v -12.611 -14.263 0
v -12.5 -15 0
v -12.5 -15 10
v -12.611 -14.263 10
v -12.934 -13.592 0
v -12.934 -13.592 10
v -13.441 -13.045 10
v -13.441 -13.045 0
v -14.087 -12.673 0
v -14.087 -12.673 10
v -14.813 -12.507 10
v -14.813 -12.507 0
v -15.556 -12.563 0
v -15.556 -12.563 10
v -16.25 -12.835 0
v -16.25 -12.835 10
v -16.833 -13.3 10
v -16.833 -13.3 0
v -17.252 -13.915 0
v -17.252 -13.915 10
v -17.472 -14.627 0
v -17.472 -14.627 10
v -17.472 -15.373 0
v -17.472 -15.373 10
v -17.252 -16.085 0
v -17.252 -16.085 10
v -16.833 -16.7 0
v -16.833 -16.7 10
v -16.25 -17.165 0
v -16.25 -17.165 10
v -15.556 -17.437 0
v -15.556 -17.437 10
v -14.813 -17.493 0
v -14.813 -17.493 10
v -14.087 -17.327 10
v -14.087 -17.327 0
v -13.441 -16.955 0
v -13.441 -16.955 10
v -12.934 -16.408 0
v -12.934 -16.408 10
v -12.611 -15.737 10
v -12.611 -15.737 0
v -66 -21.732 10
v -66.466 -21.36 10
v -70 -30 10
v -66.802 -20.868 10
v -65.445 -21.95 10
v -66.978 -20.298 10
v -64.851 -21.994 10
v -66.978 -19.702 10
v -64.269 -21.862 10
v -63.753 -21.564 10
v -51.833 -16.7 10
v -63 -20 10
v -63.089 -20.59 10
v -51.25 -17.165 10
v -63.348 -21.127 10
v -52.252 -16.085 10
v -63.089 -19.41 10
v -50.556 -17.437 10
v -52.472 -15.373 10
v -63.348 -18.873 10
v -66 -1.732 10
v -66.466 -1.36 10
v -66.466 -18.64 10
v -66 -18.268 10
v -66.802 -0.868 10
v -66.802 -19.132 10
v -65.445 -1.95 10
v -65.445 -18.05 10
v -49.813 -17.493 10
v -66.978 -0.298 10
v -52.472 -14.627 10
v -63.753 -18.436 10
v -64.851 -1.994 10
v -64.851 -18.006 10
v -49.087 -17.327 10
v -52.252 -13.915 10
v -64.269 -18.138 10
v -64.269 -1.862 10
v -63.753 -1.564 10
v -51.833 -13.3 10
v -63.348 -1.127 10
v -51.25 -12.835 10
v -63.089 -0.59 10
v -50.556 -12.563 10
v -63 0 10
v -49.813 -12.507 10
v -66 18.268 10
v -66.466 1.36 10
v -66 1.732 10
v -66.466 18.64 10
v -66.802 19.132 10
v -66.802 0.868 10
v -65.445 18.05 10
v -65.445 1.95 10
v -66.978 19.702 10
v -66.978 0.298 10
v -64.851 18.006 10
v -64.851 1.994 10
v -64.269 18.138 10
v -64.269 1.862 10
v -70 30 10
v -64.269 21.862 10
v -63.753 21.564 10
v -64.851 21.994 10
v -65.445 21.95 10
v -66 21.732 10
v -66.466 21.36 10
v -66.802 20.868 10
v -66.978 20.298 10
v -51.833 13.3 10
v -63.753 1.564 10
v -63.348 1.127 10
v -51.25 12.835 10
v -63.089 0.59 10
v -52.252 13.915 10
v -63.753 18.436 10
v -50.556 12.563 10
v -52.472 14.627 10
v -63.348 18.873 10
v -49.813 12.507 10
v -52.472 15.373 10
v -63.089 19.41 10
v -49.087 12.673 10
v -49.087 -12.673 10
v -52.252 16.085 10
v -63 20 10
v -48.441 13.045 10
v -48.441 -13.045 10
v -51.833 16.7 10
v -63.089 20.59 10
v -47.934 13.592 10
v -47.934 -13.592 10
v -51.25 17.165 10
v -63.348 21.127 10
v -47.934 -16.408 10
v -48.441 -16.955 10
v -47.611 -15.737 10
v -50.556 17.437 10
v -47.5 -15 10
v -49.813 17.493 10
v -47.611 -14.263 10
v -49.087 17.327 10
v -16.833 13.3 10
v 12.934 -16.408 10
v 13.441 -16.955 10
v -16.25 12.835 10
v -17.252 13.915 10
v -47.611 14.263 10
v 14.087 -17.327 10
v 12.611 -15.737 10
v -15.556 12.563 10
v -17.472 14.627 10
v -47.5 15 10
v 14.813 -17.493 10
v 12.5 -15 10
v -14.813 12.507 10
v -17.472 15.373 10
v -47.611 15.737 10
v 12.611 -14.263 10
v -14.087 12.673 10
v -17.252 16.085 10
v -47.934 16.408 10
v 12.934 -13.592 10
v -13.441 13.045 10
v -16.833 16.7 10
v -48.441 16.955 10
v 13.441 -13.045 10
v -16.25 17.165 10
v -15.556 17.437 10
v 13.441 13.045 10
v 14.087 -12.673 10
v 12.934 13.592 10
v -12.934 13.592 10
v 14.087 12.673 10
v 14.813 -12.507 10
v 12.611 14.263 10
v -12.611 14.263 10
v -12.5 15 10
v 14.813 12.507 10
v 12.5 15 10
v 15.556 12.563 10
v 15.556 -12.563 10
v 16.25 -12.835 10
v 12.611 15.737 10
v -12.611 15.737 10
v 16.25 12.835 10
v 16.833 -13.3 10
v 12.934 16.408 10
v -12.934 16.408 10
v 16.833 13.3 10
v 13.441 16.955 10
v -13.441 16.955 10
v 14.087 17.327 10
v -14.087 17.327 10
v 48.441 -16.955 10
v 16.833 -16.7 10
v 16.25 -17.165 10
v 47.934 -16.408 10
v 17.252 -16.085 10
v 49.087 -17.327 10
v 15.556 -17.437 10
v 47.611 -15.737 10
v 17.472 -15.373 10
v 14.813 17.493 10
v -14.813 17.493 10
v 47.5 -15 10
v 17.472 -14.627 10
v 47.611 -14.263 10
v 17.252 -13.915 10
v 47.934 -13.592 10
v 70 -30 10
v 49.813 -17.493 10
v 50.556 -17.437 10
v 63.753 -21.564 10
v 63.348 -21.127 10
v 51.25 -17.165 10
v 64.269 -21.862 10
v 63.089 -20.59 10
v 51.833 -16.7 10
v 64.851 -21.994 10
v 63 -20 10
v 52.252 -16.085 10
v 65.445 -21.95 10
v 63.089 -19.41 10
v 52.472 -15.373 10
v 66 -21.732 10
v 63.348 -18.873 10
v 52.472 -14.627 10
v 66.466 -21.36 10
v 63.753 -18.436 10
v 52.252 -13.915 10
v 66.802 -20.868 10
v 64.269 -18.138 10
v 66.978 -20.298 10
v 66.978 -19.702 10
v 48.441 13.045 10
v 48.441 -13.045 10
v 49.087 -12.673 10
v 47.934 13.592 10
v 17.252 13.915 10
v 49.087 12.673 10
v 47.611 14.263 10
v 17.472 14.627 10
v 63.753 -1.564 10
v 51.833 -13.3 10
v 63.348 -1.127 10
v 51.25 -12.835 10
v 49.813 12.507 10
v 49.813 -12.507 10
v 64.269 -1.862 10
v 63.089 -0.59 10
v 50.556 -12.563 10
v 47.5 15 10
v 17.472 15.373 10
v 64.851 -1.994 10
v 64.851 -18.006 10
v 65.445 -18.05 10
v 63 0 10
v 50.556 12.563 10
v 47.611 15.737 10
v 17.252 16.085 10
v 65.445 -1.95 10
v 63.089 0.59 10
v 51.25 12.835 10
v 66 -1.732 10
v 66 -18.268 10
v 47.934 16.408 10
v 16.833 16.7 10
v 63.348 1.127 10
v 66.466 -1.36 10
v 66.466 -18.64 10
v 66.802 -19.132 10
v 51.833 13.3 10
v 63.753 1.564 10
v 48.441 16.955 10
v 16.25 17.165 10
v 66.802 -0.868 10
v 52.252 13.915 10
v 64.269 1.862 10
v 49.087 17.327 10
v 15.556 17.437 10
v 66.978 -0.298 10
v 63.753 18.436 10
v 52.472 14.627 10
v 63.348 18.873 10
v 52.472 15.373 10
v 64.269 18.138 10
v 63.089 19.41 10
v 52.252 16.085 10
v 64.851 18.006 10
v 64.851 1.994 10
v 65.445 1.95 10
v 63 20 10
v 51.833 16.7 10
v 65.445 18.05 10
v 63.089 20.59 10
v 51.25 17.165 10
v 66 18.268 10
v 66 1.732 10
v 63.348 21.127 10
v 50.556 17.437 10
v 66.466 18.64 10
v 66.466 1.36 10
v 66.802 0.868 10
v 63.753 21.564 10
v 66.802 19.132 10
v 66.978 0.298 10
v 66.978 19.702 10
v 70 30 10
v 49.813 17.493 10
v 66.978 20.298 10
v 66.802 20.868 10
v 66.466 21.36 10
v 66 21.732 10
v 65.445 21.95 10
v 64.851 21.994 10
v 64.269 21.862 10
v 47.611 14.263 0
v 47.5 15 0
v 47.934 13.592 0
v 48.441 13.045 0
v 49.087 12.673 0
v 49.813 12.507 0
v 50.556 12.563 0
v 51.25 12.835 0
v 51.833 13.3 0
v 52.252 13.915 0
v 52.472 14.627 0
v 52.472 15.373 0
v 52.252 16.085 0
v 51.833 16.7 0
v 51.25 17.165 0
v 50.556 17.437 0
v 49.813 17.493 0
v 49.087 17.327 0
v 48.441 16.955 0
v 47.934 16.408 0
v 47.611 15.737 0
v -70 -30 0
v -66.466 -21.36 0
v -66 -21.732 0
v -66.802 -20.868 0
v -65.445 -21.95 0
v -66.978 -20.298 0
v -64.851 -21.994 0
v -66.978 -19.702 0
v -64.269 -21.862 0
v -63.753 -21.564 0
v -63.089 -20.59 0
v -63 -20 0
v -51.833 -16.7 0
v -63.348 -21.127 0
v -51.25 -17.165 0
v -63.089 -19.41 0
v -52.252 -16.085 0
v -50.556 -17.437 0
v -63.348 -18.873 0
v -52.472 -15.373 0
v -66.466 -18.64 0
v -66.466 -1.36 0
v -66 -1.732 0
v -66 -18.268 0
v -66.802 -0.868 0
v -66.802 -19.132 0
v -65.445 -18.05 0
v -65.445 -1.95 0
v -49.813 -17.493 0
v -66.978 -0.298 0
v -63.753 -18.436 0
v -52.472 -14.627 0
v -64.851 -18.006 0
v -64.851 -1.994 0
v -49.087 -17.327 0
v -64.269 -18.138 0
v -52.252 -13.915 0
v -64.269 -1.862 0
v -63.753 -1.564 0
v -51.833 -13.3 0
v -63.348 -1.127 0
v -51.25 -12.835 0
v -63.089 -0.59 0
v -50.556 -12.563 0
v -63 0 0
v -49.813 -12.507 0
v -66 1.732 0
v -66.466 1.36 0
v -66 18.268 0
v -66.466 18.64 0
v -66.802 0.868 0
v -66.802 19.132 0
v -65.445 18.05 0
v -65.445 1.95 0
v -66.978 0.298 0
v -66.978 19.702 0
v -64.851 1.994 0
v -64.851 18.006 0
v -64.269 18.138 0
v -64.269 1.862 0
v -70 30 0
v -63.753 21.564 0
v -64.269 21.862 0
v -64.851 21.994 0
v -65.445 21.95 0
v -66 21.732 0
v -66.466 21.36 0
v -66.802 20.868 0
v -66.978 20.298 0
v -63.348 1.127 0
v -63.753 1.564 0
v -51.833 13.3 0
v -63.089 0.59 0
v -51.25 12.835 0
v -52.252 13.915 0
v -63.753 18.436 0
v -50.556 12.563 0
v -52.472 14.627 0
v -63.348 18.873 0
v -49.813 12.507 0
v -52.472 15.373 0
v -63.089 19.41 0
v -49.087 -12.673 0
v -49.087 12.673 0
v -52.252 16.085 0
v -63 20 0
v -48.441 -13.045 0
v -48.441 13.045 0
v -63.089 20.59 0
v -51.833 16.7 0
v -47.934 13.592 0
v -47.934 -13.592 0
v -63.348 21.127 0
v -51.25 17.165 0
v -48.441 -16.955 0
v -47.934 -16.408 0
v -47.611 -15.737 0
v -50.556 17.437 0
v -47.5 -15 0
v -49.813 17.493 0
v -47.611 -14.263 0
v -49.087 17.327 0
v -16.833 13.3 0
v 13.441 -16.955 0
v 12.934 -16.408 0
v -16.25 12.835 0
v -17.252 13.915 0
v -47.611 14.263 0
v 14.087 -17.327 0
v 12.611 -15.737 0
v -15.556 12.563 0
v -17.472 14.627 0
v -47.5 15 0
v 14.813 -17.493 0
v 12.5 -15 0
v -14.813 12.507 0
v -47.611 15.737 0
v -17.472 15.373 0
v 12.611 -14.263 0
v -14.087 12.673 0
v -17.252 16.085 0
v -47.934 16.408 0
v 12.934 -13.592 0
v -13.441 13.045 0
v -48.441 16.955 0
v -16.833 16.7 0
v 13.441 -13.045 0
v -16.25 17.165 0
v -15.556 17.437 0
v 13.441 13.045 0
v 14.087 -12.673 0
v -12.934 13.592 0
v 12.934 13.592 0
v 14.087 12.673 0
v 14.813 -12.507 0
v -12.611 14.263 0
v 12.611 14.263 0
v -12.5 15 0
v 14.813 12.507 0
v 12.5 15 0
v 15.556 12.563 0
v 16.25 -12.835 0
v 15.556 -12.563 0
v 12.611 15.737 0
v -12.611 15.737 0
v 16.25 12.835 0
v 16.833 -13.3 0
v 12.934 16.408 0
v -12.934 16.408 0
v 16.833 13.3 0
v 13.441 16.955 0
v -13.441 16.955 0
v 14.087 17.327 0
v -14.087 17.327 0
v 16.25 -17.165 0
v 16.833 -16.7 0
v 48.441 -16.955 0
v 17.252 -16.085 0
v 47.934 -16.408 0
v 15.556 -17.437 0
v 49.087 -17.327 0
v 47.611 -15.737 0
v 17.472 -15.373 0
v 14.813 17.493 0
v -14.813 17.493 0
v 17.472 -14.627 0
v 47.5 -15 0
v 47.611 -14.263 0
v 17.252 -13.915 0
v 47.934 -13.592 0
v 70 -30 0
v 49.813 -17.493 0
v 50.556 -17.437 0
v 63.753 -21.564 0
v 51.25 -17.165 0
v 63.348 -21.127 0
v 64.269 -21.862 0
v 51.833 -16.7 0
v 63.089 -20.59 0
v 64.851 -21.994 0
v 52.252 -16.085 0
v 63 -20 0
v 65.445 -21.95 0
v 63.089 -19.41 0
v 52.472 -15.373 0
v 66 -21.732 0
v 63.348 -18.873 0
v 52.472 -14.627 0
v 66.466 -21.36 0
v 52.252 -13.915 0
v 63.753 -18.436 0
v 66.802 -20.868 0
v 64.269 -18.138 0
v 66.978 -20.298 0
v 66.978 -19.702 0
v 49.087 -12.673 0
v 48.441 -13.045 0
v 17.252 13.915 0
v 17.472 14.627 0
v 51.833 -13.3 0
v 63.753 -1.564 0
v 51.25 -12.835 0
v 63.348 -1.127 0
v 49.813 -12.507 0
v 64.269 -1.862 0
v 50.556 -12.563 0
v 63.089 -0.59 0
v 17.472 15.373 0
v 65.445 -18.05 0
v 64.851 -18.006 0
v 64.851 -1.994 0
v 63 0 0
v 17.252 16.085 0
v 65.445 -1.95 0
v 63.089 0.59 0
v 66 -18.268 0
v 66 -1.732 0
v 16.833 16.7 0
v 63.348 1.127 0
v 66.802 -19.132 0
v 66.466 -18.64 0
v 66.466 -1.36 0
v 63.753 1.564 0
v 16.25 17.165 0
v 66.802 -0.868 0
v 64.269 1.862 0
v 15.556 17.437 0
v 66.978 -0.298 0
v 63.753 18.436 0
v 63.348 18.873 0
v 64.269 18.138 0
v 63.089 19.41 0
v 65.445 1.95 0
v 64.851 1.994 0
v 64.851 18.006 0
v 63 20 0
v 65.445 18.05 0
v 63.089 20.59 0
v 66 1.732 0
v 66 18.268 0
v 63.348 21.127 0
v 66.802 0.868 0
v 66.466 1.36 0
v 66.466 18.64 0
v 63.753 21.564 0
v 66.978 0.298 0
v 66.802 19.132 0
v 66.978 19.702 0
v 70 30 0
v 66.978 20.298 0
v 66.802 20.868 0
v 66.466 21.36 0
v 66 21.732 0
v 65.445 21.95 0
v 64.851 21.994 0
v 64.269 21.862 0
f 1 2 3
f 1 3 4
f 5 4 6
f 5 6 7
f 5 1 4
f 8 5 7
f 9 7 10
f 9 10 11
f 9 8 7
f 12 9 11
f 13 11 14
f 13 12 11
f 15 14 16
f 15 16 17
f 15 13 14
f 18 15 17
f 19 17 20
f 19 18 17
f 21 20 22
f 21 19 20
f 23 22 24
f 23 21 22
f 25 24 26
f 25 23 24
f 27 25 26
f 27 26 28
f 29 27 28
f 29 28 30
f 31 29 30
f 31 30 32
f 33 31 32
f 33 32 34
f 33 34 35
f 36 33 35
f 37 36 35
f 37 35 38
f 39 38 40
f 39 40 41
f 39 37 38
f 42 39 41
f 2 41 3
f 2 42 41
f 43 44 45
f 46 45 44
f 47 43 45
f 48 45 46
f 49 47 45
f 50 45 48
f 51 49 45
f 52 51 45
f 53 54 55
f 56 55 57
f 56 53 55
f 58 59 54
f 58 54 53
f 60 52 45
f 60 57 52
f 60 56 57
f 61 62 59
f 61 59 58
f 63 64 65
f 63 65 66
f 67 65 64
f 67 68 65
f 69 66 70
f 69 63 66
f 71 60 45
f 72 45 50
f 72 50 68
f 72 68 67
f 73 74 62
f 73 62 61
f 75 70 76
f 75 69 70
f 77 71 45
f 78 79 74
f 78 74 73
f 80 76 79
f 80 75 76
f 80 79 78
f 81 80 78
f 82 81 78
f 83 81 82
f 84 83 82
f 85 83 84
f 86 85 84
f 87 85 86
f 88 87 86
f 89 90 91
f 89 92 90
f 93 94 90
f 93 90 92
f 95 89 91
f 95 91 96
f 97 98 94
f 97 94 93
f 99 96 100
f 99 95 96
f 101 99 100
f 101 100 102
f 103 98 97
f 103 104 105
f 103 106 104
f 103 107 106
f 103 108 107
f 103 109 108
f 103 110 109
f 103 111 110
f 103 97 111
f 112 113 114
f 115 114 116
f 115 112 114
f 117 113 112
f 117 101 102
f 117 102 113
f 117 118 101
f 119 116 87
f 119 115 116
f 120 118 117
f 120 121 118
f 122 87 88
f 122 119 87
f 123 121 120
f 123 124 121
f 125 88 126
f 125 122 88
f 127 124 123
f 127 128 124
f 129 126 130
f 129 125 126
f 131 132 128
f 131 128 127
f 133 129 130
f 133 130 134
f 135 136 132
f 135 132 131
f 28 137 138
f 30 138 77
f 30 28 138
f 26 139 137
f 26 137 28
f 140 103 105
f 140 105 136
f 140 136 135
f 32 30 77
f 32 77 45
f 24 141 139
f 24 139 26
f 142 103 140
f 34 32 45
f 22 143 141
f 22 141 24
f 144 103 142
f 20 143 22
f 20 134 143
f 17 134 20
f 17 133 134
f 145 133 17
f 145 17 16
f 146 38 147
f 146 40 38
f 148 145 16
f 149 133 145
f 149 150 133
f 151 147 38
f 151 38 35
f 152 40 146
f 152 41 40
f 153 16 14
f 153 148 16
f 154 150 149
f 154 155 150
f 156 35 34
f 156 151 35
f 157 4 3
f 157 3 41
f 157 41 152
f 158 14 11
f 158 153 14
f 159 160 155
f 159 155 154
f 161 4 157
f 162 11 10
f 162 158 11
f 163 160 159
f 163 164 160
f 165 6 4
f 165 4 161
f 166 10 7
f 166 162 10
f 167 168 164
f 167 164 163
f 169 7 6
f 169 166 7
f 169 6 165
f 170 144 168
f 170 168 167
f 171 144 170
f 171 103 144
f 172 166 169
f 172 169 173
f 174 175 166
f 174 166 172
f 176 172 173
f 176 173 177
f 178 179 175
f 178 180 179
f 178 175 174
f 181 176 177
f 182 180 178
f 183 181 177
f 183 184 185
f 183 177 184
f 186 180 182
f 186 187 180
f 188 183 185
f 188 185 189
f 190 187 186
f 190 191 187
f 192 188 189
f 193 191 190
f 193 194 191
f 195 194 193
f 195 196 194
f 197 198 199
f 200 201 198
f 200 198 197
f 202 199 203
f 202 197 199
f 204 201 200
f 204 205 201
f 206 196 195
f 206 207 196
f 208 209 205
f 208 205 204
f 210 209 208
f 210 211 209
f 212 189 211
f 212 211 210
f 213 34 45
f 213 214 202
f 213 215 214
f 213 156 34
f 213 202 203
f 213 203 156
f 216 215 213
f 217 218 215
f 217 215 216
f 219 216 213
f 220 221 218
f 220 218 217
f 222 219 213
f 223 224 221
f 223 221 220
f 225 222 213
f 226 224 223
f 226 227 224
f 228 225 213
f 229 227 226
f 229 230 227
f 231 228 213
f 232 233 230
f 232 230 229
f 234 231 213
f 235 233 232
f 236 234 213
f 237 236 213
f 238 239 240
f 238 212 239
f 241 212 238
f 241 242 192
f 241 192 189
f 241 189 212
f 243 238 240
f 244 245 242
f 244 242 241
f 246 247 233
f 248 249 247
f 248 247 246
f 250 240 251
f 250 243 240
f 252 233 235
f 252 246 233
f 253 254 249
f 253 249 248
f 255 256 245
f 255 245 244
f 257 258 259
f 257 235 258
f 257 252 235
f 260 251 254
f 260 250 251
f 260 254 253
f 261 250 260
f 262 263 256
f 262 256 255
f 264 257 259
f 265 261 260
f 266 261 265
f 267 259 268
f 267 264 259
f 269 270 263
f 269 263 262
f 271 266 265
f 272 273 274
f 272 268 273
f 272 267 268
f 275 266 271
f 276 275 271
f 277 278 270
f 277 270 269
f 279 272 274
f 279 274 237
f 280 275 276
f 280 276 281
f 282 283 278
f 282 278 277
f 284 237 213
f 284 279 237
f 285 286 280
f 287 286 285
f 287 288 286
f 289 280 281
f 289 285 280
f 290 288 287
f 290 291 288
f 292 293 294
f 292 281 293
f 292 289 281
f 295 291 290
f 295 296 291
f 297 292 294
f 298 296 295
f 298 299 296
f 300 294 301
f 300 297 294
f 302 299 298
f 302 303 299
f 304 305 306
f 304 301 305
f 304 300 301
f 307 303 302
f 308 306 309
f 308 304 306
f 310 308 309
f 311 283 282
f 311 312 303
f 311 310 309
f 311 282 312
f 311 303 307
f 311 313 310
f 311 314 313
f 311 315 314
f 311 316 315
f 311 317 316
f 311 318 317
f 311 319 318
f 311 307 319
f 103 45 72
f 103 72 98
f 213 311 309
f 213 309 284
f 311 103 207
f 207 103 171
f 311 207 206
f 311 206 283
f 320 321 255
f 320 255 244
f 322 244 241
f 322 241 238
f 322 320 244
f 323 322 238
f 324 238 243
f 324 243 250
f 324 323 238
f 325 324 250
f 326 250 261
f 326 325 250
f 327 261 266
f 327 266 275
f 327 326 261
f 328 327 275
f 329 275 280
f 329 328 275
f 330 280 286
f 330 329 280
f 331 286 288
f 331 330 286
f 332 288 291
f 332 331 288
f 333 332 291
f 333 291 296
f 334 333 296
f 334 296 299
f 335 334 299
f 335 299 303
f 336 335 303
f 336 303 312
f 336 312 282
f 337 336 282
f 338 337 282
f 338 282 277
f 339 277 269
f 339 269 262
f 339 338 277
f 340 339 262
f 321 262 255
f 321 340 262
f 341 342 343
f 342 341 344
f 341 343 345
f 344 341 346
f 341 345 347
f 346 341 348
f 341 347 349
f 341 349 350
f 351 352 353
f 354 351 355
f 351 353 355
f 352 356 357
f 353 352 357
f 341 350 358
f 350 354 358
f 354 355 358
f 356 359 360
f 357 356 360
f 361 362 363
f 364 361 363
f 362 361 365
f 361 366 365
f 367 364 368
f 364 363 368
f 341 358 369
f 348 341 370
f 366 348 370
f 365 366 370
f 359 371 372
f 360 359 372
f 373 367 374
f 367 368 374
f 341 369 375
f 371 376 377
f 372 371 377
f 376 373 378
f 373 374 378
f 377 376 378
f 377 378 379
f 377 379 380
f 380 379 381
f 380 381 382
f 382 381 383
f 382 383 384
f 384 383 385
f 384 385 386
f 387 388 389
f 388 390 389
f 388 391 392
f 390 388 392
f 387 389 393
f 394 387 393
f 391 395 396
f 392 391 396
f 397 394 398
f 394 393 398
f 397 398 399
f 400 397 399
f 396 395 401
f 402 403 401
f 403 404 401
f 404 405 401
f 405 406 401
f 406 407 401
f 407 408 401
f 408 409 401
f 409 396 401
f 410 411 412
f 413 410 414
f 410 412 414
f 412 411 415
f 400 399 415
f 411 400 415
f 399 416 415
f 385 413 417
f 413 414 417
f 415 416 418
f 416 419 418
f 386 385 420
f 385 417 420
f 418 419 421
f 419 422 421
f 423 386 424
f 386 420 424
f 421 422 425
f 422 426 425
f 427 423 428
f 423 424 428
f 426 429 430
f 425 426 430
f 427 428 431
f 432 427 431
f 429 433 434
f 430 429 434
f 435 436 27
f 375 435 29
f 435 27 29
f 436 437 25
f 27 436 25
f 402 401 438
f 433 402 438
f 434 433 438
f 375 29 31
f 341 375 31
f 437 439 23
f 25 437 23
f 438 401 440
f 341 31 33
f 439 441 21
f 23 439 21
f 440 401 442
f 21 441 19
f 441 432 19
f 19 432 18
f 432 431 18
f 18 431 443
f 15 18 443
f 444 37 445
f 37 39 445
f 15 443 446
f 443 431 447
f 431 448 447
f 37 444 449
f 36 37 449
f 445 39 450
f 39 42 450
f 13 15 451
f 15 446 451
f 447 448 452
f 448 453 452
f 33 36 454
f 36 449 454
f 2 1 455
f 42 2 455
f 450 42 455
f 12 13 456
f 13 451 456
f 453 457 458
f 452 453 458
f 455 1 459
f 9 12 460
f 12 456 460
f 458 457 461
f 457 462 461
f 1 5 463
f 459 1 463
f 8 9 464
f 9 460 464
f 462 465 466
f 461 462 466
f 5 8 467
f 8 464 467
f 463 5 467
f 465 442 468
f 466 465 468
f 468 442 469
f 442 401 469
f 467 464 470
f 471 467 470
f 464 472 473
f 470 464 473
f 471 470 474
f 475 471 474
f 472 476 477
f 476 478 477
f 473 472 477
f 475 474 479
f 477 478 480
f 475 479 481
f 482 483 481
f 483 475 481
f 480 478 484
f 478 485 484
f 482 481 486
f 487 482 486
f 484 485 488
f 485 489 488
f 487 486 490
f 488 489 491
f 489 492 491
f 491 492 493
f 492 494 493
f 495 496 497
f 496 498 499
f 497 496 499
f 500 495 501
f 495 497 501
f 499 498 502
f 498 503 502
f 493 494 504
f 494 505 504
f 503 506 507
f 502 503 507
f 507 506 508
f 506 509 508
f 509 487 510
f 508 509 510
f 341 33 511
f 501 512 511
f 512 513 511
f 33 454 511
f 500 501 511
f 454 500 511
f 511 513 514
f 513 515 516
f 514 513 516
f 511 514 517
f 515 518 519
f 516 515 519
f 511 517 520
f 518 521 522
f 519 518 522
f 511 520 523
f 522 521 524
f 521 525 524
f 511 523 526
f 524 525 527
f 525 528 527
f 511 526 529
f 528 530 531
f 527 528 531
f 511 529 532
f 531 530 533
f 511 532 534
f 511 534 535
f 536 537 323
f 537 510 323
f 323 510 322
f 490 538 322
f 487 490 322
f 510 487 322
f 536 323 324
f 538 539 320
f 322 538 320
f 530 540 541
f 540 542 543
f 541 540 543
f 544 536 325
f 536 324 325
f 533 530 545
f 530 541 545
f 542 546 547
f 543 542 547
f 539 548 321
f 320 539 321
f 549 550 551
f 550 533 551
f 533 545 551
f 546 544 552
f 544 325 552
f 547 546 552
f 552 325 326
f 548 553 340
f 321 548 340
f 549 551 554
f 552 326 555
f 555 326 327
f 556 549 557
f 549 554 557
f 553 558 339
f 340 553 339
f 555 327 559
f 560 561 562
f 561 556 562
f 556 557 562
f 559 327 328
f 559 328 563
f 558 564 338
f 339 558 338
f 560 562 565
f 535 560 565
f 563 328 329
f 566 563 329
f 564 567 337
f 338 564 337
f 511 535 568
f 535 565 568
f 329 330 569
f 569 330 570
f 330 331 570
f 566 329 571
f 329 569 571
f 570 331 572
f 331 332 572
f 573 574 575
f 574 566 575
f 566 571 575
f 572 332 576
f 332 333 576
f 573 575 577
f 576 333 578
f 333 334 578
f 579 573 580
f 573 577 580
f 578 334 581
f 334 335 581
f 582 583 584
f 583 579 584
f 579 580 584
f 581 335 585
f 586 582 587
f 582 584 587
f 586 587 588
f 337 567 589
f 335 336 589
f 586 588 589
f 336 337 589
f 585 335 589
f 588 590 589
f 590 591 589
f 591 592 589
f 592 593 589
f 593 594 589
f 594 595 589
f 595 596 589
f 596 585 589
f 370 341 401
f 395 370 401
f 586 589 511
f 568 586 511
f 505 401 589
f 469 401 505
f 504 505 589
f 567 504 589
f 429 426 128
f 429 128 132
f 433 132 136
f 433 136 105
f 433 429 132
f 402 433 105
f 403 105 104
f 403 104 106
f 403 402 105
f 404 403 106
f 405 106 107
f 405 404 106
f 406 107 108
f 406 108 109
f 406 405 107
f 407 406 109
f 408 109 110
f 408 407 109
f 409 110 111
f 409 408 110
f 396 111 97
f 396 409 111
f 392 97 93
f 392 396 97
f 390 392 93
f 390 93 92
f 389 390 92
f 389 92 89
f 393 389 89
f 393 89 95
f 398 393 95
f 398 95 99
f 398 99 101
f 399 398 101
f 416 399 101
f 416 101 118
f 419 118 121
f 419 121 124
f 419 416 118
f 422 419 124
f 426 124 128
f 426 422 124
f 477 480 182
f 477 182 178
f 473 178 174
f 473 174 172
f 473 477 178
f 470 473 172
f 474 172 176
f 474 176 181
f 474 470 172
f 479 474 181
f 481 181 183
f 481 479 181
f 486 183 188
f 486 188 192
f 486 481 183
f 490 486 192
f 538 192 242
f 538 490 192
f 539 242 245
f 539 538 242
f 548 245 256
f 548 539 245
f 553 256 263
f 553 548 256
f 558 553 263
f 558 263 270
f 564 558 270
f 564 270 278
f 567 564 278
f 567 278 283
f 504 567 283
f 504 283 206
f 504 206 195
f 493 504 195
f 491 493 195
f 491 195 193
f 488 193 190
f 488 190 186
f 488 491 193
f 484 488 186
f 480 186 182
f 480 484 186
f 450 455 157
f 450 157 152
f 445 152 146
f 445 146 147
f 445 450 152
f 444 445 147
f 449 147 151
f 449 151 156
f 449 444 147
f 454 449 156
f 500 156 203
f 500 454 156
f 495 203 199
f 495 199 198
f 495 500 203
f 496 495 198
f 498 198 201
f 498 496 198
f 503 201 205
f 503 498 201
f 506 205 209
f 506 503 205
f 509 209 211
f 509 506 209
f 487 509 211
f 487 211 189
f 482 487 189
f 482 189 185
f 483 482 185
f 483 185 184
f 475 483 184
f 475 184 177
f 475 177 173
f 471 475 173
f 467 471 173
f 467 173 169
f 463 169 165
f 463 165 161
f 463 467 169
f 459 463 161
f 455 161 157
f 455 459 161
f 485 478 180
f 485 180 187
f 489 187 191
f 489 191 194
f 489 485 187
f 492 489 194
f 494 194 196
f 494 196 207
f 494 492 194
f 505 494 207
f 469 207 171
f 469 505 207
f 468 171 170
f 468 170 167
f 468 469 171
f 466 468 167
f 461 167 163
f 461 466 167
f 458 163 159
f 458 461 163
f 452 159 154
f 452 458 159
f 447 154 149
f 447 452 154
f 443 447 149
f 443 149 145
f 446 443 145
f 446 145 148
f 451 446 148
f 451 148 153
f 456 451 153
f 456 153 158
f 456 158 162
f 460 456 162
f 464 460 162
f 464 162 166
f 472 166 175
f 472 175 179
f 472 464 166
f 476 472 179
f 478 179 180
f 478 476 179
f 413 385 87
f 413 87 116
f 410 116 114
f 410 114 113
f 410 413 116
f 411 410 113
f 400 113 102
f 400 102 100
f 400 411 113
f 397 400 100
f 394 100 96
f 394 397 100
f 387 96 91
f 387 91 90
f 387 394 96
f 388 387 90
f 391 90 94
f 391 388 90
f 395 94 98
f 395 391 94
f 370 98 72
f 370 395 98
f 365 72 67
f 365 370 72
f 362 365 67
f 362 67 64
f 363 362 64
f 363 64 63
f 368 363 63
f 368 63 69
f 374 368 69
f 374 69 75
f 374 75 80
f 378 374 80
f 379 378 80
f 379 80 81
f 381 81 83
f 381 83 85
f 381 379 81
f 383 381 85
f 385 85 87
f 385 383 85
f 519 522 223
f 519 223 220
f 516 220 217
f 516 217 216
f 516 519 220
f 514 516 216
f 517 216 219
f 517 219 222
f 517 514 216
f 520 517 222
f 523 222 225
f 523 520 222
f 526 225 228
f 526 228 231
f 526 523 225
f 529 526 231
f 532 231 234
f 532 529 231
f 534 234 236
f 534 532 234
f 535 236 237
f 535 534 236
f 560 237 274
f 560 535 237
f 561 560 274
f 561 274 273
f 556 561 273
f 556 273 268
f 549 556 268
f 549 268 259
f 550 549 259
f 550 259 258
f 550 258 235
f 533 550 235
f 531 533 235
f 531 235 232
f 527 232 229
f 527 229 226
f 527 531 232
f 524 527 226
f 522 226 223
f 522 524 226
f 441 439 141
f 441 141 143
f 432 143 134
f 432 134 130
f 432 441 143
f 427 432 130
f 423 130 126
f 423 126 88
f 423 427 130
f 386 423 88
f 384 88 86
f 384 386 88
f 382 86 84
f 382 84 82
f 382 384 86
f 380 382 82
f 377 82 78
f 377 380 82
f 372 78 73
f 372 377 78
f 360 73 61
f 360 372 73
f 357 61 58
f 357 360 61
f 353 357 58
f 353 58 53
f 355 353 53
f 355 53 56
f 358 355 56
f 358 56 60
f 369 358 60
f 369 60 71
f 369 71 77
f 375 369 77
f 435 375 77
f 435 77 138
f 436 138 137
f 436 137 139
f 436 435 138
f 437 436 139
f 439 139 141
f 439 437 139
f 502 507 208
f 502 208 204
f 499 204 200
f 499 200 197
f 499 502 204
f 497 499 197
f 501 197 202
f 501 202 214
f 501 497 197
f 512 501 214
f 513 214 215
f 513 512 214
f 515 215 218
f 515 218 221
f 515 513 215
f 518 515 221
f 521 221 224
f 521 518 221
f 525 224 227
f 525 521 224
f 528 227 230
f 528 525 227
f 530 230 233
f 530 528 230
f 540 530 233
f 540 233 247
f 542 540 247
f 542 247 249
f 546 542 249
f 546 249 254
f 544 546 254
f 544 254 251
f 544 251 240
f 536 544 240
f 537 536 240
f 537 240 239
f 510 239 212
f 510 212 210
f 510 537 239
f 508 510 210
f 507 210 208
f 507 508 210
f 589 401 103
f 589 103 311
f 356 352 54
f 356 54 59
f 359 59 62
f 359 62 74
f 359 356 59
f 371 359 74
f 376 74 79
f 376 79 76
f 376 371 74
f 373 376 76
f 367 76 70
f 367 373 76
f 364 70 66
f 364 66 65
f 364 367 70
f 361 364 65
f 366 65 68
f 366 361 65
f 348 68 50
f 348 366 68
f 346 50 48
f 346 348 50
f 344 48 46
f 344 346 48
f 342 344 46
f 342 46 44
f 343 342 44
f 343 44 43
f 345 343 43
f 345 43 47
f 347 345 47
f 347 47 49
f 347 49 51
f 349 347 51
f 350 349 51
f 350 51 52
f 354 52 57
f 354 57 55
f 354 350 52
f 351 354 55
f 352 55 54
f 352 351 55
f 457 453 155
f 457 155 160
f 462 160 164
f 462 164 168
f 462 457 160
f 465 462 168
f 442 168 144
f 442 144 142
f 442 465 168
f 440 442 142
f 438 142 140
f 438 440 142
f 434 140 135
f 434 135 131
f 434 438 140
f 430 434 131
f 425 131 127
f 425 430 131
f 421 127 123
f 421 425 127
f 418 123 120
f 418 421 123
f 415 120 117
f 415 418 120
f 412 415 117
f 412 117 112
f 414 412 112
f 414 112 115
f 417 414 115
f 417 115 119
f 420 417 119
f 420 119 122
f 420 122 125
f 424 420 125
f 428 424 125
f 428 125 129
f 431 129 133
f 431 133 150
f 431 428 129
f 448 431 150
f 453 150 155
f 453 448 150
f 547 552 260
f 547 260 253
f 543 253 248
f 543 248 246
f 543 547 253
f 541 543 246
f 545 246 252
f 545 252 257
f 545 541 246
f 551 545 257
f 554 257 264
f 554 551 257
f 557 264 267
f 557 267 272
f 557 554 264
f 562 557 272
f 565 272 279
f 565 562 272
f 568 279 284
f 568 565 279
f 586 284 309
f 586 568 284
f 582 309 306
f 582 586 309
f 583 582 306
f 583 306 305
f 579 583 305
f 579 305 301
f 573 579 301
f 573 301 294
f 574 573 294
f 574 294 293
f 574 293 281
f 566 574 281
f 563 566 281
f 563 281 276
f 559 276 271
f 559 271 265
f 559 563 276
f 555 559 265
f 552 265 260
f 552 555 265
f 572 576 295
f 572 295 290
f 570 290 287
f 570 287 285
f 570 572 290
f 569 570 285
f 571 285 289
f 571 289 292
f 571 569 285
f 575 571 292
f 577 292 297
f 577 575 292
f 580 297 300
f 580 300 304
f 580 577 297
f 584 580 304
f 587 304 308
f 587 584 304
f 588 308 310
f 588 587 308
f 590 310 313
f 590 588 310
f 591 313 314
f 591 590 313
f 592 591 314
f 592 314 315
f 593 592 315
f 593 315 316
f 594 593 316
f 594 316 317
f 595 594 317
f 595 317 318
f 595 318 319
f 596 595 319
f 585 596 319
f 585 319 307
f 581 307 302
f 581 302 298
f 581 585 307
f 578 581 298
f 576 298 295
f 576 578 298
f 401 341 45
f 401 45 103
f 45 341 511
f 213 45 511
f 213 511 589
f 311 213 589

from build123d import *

# Parameters (mm, degrees)
SKETCH_1_W      = 140
SKETCH_1_H      = 60
SKETCH_1_R      = 2
SKETCH_1_R_2    = 2.5
EXTRUDE_1_DEPTH = 10


with BuildPart() as part:
    # Эскиз1 → Бобышка-Вытянуть1 (new body)
    with BuildSketch(Plane.XY):
        Rectangle(SKETCH_1_W, SKETCH_1_H)
        with Locations((-65, 0)):
            Circle(SKETCH_1_R, mode=Mode.SUBTRACT)
        with Locations((-65, 20)):
            Circle(SKETCH_1_R, mode=Mode.SUBTRACT)
        with Locations((-65, -20)):
            Circle(SKETCH_1_R, mode=Mode.SUBTRACT)
        with Locations(Location((65, -20, 0), (0, 0, 180))):
            Circle(SKETCH_1_R, mode=Mode.SUBTRACT)
        with Locations(Location((65, 20, 0), (0, 0, 180))):
            Circle(SKETCH_1_R, mode=Mode.SUBTRACT)
        with Locations(Location((65, 0, 0), (0, 0, 180))):
            Circle(SKETCH_1_R, mode=Mode.SUBTRACT)
        with Locations((-50, 15)):
            Circle(SKETCH_1_R_2, mode=Mode.SUBTRACT)
        with Locations((-50, -15)):
            Circle(SKETCH_1_R_2, mode=Mode.SUBTRACT)
        with Locations((-15, 15)):
            Circle(SKETCH_1_R_2, mode=Mode.SUBTRACT)
        with Locations((-15, -15)):
            Circle(SKETCH_1_R_2, mode=Mode.SUBTRACT)
        with Locations(Location((15, -15, 0), (0, 0, 180))):
            Circle(SKETCH_1_R_2, mode=Mode.SUBTRACT)
        with Locations(Location((15, 15, 0), (0, 0, 180))):
            Circle(SKETCH_1_R_2, mode=Mode.SUBTRACT)
        with Locations(Location((50, -15, 0), (0, 0, 180))):
            Circle(SKETCH_1_R_2, mode=Mode.SUBTRACT)
        with Locations(Location((50, 15, 0), (0, 0, 180))):
            Circle(SKETCH_1_R_2, mode=Mode.SUBTRACT)
    extrude(amount=EXTRUDE_1_DEPTH)


solid = part.part
